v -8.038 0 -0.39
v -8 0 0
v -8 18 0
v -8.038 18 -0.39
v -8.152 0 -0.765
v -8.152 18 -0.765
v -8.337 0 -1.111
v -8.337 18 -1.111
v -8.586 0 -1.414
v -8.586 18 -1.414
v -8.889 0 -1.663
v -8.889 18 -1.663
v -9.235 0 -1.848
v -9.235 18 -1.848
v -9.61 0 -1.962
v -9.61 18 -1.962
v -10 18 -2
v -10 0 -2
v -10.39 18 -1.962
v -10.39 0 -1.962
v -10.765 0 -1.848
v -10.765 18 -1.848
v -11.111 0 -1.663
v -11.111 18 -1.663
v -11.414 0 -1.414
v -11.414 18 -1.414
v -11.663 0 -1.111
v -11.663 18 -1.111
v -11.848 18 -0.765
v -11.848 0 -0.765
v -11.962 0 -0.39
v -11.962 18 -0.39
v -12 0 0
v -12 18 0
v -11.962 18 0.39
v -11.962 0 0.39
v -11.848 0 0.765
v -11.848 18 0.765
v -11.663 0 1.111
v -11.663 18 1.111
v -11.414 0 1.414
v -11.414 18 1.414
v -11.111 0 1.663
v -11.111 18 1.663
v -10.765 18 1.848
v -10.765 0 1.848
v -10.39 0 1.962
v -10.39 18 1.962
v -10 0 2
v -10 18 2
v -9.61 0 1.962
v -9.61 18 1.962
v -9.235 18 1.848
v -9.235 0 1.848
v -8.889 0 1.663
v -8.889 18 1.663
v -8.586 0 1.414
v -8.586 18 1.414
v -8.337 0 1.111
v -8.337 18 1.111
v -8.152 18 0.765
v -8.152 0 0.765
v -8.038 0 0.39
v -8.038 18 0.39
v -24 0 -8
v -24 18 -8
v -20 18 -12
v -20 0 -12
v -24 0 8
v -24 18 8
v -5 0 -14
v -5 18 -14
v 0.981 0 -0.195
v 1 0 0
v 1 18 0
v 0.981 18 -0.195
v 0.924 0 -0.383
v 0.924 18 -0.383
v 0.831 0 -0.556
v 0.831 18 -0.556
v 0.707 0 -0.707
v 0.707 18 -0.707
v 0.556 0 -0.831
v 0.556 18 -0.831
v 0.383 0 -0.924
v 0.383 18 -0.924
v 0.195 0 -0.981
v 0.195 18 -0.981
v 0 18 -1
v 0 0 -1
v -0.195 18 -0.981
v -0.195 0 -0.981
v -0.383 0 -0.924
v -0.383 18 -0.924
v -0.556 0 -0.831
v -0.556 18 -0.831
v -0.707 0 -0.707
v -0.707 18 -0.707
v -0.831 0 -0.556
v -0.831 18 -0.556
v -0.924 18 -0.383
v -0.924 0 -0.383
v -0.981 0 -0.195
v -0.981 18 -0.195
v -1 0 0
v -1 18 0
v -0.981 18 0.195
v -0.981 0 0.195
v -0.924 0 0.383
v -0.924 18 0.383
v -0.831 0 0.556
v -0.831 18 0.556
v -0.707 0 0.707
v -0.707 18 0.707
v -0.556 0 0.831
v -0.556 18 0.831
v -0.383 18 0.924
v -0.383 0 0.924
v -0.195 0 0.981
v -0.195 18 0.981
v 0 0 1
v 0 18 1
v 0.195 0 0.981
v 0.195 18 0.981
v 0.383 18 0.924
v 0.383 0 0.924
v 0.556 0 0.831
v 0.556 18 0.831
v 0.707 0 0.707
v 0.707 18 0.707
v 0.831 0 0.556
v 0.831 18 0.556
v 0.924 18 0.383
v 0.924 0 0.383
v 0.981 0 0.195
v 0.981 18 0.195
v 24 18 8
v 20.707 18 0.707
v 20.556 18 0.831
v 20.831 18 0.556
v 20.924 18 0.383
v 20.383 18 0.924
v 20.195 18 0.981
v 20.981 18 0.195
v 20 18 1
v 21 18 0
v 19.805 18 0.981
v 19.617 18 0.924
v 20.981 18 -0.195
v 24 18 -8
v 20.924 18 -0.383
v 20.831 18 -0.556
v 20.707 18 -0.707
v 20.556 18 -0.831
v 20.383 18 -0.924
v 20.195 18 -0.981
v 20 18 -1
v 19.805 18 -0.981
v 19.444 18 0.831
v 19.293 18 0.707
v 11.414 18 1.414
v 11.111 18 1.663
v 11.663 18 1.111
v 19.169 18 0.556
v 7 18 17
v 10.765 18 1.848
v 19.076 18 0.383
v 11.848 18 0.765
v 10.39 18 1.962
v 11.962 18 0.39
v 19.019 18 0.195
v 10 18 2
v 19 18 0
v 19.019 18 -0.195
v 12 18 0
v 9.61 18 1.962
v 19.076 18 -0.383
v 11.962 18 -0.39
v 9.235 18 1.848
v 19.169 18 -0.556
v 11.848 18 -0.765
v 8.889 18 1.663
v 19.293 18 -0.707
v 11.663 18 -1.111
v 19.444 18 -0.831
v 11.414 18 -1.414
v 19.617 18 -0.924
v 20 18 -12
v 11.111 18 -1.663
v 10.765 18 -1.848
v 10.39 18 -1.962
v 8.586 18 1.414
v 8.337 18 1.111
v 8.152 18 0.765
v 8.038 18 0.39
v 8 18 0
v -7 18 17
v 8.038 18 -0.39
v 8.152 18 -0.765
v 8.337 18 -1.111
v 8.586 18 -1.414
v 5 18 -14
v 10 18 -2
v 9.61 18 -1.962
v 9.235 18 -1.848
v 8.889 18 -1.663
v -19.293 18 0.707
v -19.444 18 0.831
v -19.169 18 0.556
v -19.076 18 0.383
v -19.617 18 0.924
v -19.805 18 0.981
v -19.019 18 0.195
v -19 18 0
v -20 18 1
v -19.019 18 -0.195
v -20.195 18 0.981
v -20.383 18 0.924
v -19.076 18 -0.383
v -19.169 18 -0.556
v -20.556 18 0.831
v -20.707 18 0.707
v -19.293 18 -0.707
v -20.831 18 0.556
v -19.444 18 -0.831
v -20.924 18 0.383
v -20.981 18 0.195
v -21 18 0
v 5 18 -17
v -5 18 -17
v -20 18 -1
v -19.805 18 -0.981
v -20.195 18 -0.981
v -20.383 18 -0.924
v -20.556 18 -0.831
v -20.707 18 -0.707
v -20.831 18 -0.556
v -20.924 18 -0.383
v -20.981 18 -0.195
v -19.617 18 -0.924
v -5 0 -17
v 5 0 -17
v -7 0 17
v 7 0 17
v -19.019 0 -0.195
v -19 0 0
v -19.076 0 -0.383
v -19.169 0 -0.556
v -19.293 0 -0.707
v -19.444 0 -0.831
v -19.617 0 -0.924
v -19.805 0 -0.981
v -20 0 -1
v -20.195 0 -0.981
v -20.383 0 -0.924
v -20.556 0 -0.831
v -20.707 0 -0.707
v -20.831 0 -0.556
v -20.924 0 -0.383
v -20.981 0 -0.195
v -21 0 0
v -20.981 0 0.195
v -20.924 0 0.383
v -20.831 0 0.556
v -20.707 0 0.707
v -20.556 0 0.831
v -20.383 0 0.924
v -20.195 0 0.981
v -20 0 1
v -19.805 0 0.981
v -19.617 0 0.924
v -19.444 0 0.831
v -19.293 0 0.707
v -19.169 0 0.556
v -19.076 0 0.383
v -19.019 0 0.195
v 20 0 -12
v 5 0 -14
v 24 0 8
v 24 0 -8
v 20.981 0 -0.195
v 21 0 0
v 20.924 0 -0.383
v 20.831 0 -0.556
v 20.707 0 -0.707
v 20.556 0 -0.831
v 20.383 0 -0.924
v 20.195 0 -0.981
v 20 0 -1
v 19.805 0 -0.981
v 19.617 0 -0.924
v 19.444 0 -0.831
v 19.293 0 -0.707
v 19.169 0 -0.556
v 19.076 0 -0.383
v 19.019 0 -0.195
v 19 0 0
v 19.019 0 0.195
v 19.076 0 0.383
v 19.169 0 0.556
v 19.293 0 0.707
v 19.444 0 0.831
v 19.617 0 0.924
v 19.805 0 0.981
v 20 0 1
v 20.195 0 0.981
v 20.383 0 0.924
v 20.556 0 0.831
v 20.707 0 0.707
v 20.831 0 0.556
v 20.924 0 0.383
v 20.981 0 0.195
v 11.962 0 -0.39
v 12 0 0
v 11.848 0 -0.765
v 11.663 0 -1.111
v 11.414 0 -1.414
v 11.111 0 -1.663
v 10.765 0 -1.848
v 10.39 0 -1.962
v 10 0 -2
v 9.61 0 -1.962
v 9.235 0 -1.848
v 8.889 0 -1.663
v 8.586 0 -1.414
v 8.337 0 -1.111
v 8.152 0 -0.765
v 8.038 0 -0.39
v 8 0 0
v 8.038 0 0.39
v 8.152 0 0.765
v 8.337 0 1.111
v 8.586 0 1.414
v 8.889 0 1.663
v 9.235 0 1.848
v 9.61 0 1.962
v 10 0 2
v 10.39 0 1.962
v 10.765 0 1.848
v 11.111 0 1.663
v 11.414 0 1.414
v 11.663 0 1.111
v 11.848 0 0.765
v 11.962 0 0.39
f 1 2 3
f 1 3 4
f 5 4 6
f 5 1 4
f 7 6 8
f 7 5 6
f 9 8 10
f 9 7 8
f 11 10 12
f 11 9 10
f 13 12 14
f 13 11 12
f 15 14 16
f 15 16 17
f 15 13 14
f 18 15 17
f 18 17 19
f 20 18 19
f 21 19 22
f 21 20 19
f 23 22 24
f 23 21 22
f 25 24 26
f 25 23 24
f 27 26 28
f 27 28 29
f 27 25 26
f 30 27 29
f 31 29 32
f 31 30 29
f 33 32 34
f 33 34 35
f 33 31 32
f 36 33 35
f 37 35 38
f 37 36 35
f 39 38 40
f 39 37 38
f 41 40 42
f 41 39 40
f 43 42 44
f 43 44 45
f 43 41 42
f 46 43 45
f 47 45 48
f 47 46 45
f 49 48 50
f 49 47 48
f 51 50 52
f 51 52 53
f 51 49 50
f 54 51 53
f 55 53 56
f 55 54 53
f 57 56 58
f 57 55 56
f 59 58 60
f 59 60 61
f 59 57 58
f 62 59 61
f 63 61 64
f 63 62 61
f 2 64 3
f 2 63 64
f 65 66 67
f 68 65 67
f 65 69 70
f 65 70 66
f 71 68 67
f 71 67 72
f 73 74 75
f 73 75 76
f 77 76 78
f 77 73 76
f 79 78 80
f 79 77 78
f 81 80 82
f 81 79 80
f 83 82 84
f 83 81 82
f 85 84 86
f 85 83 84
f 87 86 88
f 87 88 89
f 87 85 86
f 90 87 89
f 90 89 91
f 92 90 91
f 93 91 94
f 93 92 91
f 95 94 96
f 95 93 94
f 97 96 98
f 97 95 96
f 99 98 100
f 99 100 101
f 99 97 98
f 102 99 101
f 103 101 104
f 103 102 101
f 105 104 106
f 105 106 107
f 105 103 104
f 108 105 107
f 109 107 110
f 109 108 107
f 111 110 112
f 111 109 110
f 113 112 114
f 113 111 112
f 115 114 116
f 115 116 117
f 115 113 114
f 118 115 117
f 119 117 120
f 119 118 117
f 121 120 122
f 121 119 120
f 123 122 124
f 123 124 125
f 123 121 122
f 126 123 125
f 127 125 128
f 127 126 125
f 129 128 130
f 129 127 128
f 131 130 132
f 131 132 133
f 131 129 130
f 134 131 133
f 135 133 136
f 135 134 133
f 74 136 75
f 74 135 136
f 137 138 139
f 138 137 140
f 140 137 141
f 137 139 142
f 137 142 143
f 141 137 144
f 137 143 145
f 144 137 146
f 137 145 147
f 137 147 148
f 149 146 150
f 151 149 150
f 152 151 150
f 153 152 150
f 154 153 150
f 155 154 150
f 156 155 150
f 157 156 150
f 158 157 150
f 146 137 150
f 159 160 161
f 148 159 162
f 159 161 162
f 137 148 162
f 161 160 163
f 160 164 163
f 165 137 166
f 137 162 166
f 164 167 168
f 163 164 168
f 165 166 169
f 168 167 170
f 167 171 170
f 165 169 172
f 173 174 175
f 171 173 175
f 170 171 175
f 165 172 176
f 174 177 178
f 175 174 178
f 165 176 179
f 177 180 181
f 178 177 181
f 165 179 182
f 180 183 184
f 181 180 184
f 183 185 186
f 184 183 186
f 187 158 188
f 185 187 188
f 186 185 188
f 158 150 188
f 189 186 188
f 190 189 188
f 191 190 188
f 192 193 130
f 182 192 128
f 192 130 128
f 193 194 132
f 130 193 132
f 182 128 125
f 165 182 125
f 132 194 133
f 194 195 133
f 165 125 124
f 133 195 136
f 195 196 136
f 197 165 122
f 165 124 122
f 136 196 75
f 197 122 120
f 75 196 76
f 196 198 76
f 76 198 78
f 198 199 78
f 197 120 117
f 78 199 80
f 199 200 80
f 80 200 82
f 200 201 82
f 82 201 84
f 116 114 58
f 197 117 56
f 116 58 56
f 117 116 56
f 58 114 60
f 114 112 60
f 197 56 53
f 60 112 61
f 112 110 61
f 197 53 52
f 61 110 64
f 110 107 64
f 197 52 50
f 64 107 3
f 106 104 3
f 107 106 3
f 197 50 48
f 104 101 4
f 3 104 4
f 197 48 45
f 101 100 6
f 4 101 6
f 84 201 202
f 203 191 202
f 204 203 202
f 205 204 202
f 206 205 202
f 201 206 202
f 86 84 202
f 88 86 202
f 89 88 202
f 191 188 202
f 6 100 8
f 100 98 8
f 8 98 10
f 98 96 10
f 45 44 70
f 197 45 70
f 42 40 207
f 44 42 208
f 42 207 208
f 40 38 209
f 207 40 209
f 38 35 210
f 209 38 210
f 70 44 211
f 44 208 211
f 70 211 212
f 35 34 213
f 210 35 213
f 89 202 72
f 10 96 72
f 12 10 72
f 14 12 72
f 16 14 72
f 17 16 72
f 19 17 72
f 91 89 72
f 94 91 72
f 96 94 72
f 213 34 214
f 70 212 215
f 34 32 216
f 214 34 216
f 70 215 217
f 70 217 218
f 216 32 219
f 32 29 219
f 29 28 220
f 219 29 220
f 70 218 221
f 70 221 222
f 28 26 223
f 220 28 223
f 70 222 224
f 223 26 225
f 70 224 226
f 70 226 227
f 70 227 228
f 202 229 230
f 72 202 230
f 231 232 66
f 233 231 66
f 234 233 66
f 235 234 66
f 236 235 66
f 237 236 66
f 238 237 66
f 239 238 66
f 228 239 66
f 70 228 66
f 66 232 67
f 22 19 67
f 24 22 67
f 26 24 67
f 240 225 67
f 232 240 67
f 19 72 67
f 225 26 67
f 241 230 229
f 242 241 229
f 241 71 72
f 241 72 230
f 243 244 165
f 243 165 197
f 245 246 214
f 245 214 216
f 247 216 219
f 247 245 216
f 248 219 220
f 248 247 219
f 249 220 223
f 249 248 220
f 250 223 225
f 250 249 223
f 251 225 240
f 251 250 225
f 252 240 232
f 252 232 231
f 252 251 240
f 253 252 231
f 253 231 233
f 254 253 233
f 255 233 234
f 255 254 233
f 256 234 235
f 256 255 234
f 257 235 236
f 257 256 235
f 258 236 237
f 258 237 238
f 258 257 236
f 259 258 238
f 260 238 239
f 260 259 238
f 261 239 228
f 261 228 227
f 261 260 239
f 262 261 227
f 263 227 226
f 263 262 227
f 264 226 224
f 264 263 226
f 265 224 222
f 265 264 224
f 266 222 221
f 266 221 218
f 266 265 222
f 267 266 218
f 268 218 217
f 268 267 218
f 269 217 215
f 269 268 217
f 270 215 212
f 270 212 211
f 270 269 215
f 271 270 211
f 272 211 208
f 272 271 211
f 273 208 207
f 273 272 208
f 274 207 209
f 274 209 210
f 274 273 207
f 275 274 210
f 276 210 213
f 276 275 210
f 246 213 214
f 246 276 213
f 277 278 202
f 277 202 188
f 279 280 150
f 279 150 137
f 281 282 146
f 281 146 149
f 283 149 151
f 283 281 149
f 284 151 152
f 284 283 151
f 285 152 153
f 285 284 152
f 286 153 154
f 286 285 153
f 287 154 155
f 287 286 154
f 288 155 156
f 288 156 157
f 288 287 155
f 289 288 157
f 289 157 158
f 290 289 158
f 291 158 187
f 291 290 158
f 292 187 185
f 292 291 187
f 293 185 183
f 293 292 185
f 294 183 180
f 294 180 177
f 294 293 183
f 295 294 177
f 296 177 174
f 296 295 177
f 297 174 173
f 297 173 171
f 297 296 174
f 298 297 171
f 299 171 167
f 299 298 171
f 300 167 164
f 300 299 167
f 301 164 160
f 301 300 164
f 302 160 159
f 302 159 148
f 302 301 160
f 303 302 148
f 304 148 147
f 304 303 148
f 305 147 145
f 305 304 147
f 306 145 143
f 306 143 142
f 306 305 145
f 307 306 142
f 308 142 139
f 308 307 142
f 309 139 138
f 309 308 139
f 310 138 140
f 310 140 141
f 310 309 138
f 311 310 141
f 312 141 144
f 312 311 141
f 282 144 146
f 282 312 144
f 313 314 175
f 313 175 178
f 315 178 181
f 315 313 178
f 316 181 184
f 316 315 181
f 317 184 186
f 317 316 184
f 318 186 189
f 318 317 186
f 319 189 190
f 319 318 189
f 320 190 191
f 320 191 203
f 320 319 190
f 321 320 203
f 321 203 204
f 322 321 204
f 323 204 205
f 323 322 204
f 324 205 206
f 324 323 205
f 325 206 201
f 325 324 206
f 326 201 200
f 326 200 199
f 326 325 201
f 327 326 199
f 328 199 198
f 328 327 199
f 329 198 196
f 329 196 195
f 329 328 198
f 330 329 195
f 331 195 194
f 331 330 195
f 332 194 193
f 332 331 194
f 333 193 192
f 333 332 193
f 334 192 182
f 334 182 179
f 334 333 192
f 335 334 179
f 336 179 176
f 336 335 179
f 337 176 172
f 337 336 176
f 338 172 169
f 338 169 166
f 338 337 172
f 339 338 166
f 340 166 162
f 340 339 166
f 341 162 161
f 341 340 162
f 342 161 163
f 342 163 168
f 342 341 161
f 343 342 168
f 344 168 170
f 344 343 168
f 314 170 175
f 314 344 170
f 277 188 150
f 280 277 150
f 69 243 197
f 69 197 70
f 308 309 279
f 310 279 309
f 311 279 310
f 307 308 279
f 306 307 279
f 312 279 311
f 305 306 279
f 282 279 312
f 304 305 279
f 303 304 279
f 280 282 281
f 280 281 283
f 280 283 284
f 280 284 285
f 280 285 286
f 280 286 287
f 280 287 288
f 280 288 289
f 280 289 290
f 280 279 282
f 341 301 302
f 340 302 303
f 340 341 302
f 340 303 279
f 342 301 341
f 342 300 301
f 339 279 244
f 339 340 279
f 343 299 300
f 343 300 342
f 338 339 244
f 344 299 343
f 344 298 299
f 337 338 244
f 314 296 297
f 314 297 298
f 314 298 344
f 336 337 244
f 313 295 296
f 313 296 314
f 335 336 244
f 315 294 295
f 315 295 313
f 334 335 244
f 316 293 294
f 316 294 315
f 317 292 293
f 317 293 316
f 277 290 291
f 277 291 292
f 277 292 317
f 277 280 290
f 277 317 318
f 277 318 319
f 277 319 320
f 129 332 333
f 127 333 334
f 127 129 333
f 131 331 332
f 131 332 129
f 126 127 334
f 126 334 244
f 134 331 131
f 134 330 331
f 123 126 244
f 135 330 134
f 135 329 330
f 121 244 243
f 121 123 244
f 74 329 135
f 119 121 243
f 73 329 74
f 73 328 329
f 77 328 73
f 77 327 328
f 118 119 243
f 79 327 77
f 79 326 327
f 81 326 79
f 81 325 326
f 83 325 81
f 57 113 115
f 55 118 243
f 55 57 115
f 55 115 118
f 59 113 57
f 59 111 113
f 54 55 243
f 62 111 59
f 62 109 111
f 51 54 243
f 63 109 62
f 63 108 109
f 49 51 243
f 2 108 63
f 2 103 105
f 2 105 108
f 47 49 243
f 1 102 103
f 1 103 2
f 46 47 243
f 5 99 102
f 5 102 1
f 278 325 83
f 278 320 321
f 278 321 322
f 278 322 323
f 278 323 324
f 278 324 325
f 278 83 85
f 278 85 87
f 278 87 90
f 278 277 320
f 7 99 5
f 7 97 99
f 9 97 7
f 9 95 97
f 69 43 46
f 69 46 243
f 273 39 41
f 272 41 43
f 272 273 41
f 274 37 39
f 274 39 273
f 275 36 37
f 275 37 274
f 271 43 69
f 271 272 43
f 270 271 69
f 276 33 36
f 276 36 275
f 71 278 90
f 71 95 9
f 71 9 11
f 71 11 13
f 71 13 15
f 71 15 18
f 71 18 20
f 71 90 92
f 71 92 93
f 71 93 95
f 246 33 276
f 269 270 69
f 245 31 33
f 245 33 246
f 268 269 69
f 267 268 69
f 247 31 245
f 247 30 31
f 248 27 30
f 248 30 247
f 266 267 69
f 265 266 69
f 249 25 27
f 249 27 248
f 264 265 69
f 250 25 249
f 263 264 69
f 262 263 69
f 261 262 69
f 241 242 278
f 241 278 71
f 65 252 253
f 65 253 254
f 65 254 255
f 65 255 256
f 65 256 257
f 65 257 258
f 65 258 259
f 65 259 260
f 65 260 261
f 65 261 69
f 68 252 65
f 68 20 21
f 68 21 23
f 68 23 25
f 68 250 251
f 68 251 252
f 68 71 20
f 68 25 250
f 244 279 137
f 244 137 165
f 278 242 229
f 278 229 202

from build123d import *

# Parameters (mm, degrees)
SKETCH_1_R      = 1
SKETCH_1_R_2    = 2
EXTRUDE_1_DEPTH = 18


with BuildPart() as part:
    # Эскиз1 → Бобышка-Вытянуть1 (new body)
    with BuildSketch(Plane(origin=(0, 0, 0), x_dir=(1, 0, 0), z_dir=(0, 1, 0))):
        Polygon((24, 8), (24, -8), (7, -17), (-7, -17), (-24, -8), (-24, 8), (-20, 12), (-5, 14), (-5, 17), (5, 17), (5, 14), (20, 12), align=None)
        Circle(SKETCH_1_R, mode=Mode.SUBTRACT)
        with Locations((20, 0)):
            Circle(SKETCH_1_R, mode=Mode.SUBTRACT)
        with Locations((-20, 0)):
            Circle(SKETCH_1_R, mode=Mode.SUBTRACT)
        with Locations((-10, 0)):
            Circle(SKETCH_1_R_2, mode=Mode.SUBTRACT)
        with Locations((10, 0)):
            Circle(SKETCH_1_R_2, mode=Mode.SUBTRACT)
    extrude(amount=EXTRUDE_1_DEPTH)


solid = part.part
